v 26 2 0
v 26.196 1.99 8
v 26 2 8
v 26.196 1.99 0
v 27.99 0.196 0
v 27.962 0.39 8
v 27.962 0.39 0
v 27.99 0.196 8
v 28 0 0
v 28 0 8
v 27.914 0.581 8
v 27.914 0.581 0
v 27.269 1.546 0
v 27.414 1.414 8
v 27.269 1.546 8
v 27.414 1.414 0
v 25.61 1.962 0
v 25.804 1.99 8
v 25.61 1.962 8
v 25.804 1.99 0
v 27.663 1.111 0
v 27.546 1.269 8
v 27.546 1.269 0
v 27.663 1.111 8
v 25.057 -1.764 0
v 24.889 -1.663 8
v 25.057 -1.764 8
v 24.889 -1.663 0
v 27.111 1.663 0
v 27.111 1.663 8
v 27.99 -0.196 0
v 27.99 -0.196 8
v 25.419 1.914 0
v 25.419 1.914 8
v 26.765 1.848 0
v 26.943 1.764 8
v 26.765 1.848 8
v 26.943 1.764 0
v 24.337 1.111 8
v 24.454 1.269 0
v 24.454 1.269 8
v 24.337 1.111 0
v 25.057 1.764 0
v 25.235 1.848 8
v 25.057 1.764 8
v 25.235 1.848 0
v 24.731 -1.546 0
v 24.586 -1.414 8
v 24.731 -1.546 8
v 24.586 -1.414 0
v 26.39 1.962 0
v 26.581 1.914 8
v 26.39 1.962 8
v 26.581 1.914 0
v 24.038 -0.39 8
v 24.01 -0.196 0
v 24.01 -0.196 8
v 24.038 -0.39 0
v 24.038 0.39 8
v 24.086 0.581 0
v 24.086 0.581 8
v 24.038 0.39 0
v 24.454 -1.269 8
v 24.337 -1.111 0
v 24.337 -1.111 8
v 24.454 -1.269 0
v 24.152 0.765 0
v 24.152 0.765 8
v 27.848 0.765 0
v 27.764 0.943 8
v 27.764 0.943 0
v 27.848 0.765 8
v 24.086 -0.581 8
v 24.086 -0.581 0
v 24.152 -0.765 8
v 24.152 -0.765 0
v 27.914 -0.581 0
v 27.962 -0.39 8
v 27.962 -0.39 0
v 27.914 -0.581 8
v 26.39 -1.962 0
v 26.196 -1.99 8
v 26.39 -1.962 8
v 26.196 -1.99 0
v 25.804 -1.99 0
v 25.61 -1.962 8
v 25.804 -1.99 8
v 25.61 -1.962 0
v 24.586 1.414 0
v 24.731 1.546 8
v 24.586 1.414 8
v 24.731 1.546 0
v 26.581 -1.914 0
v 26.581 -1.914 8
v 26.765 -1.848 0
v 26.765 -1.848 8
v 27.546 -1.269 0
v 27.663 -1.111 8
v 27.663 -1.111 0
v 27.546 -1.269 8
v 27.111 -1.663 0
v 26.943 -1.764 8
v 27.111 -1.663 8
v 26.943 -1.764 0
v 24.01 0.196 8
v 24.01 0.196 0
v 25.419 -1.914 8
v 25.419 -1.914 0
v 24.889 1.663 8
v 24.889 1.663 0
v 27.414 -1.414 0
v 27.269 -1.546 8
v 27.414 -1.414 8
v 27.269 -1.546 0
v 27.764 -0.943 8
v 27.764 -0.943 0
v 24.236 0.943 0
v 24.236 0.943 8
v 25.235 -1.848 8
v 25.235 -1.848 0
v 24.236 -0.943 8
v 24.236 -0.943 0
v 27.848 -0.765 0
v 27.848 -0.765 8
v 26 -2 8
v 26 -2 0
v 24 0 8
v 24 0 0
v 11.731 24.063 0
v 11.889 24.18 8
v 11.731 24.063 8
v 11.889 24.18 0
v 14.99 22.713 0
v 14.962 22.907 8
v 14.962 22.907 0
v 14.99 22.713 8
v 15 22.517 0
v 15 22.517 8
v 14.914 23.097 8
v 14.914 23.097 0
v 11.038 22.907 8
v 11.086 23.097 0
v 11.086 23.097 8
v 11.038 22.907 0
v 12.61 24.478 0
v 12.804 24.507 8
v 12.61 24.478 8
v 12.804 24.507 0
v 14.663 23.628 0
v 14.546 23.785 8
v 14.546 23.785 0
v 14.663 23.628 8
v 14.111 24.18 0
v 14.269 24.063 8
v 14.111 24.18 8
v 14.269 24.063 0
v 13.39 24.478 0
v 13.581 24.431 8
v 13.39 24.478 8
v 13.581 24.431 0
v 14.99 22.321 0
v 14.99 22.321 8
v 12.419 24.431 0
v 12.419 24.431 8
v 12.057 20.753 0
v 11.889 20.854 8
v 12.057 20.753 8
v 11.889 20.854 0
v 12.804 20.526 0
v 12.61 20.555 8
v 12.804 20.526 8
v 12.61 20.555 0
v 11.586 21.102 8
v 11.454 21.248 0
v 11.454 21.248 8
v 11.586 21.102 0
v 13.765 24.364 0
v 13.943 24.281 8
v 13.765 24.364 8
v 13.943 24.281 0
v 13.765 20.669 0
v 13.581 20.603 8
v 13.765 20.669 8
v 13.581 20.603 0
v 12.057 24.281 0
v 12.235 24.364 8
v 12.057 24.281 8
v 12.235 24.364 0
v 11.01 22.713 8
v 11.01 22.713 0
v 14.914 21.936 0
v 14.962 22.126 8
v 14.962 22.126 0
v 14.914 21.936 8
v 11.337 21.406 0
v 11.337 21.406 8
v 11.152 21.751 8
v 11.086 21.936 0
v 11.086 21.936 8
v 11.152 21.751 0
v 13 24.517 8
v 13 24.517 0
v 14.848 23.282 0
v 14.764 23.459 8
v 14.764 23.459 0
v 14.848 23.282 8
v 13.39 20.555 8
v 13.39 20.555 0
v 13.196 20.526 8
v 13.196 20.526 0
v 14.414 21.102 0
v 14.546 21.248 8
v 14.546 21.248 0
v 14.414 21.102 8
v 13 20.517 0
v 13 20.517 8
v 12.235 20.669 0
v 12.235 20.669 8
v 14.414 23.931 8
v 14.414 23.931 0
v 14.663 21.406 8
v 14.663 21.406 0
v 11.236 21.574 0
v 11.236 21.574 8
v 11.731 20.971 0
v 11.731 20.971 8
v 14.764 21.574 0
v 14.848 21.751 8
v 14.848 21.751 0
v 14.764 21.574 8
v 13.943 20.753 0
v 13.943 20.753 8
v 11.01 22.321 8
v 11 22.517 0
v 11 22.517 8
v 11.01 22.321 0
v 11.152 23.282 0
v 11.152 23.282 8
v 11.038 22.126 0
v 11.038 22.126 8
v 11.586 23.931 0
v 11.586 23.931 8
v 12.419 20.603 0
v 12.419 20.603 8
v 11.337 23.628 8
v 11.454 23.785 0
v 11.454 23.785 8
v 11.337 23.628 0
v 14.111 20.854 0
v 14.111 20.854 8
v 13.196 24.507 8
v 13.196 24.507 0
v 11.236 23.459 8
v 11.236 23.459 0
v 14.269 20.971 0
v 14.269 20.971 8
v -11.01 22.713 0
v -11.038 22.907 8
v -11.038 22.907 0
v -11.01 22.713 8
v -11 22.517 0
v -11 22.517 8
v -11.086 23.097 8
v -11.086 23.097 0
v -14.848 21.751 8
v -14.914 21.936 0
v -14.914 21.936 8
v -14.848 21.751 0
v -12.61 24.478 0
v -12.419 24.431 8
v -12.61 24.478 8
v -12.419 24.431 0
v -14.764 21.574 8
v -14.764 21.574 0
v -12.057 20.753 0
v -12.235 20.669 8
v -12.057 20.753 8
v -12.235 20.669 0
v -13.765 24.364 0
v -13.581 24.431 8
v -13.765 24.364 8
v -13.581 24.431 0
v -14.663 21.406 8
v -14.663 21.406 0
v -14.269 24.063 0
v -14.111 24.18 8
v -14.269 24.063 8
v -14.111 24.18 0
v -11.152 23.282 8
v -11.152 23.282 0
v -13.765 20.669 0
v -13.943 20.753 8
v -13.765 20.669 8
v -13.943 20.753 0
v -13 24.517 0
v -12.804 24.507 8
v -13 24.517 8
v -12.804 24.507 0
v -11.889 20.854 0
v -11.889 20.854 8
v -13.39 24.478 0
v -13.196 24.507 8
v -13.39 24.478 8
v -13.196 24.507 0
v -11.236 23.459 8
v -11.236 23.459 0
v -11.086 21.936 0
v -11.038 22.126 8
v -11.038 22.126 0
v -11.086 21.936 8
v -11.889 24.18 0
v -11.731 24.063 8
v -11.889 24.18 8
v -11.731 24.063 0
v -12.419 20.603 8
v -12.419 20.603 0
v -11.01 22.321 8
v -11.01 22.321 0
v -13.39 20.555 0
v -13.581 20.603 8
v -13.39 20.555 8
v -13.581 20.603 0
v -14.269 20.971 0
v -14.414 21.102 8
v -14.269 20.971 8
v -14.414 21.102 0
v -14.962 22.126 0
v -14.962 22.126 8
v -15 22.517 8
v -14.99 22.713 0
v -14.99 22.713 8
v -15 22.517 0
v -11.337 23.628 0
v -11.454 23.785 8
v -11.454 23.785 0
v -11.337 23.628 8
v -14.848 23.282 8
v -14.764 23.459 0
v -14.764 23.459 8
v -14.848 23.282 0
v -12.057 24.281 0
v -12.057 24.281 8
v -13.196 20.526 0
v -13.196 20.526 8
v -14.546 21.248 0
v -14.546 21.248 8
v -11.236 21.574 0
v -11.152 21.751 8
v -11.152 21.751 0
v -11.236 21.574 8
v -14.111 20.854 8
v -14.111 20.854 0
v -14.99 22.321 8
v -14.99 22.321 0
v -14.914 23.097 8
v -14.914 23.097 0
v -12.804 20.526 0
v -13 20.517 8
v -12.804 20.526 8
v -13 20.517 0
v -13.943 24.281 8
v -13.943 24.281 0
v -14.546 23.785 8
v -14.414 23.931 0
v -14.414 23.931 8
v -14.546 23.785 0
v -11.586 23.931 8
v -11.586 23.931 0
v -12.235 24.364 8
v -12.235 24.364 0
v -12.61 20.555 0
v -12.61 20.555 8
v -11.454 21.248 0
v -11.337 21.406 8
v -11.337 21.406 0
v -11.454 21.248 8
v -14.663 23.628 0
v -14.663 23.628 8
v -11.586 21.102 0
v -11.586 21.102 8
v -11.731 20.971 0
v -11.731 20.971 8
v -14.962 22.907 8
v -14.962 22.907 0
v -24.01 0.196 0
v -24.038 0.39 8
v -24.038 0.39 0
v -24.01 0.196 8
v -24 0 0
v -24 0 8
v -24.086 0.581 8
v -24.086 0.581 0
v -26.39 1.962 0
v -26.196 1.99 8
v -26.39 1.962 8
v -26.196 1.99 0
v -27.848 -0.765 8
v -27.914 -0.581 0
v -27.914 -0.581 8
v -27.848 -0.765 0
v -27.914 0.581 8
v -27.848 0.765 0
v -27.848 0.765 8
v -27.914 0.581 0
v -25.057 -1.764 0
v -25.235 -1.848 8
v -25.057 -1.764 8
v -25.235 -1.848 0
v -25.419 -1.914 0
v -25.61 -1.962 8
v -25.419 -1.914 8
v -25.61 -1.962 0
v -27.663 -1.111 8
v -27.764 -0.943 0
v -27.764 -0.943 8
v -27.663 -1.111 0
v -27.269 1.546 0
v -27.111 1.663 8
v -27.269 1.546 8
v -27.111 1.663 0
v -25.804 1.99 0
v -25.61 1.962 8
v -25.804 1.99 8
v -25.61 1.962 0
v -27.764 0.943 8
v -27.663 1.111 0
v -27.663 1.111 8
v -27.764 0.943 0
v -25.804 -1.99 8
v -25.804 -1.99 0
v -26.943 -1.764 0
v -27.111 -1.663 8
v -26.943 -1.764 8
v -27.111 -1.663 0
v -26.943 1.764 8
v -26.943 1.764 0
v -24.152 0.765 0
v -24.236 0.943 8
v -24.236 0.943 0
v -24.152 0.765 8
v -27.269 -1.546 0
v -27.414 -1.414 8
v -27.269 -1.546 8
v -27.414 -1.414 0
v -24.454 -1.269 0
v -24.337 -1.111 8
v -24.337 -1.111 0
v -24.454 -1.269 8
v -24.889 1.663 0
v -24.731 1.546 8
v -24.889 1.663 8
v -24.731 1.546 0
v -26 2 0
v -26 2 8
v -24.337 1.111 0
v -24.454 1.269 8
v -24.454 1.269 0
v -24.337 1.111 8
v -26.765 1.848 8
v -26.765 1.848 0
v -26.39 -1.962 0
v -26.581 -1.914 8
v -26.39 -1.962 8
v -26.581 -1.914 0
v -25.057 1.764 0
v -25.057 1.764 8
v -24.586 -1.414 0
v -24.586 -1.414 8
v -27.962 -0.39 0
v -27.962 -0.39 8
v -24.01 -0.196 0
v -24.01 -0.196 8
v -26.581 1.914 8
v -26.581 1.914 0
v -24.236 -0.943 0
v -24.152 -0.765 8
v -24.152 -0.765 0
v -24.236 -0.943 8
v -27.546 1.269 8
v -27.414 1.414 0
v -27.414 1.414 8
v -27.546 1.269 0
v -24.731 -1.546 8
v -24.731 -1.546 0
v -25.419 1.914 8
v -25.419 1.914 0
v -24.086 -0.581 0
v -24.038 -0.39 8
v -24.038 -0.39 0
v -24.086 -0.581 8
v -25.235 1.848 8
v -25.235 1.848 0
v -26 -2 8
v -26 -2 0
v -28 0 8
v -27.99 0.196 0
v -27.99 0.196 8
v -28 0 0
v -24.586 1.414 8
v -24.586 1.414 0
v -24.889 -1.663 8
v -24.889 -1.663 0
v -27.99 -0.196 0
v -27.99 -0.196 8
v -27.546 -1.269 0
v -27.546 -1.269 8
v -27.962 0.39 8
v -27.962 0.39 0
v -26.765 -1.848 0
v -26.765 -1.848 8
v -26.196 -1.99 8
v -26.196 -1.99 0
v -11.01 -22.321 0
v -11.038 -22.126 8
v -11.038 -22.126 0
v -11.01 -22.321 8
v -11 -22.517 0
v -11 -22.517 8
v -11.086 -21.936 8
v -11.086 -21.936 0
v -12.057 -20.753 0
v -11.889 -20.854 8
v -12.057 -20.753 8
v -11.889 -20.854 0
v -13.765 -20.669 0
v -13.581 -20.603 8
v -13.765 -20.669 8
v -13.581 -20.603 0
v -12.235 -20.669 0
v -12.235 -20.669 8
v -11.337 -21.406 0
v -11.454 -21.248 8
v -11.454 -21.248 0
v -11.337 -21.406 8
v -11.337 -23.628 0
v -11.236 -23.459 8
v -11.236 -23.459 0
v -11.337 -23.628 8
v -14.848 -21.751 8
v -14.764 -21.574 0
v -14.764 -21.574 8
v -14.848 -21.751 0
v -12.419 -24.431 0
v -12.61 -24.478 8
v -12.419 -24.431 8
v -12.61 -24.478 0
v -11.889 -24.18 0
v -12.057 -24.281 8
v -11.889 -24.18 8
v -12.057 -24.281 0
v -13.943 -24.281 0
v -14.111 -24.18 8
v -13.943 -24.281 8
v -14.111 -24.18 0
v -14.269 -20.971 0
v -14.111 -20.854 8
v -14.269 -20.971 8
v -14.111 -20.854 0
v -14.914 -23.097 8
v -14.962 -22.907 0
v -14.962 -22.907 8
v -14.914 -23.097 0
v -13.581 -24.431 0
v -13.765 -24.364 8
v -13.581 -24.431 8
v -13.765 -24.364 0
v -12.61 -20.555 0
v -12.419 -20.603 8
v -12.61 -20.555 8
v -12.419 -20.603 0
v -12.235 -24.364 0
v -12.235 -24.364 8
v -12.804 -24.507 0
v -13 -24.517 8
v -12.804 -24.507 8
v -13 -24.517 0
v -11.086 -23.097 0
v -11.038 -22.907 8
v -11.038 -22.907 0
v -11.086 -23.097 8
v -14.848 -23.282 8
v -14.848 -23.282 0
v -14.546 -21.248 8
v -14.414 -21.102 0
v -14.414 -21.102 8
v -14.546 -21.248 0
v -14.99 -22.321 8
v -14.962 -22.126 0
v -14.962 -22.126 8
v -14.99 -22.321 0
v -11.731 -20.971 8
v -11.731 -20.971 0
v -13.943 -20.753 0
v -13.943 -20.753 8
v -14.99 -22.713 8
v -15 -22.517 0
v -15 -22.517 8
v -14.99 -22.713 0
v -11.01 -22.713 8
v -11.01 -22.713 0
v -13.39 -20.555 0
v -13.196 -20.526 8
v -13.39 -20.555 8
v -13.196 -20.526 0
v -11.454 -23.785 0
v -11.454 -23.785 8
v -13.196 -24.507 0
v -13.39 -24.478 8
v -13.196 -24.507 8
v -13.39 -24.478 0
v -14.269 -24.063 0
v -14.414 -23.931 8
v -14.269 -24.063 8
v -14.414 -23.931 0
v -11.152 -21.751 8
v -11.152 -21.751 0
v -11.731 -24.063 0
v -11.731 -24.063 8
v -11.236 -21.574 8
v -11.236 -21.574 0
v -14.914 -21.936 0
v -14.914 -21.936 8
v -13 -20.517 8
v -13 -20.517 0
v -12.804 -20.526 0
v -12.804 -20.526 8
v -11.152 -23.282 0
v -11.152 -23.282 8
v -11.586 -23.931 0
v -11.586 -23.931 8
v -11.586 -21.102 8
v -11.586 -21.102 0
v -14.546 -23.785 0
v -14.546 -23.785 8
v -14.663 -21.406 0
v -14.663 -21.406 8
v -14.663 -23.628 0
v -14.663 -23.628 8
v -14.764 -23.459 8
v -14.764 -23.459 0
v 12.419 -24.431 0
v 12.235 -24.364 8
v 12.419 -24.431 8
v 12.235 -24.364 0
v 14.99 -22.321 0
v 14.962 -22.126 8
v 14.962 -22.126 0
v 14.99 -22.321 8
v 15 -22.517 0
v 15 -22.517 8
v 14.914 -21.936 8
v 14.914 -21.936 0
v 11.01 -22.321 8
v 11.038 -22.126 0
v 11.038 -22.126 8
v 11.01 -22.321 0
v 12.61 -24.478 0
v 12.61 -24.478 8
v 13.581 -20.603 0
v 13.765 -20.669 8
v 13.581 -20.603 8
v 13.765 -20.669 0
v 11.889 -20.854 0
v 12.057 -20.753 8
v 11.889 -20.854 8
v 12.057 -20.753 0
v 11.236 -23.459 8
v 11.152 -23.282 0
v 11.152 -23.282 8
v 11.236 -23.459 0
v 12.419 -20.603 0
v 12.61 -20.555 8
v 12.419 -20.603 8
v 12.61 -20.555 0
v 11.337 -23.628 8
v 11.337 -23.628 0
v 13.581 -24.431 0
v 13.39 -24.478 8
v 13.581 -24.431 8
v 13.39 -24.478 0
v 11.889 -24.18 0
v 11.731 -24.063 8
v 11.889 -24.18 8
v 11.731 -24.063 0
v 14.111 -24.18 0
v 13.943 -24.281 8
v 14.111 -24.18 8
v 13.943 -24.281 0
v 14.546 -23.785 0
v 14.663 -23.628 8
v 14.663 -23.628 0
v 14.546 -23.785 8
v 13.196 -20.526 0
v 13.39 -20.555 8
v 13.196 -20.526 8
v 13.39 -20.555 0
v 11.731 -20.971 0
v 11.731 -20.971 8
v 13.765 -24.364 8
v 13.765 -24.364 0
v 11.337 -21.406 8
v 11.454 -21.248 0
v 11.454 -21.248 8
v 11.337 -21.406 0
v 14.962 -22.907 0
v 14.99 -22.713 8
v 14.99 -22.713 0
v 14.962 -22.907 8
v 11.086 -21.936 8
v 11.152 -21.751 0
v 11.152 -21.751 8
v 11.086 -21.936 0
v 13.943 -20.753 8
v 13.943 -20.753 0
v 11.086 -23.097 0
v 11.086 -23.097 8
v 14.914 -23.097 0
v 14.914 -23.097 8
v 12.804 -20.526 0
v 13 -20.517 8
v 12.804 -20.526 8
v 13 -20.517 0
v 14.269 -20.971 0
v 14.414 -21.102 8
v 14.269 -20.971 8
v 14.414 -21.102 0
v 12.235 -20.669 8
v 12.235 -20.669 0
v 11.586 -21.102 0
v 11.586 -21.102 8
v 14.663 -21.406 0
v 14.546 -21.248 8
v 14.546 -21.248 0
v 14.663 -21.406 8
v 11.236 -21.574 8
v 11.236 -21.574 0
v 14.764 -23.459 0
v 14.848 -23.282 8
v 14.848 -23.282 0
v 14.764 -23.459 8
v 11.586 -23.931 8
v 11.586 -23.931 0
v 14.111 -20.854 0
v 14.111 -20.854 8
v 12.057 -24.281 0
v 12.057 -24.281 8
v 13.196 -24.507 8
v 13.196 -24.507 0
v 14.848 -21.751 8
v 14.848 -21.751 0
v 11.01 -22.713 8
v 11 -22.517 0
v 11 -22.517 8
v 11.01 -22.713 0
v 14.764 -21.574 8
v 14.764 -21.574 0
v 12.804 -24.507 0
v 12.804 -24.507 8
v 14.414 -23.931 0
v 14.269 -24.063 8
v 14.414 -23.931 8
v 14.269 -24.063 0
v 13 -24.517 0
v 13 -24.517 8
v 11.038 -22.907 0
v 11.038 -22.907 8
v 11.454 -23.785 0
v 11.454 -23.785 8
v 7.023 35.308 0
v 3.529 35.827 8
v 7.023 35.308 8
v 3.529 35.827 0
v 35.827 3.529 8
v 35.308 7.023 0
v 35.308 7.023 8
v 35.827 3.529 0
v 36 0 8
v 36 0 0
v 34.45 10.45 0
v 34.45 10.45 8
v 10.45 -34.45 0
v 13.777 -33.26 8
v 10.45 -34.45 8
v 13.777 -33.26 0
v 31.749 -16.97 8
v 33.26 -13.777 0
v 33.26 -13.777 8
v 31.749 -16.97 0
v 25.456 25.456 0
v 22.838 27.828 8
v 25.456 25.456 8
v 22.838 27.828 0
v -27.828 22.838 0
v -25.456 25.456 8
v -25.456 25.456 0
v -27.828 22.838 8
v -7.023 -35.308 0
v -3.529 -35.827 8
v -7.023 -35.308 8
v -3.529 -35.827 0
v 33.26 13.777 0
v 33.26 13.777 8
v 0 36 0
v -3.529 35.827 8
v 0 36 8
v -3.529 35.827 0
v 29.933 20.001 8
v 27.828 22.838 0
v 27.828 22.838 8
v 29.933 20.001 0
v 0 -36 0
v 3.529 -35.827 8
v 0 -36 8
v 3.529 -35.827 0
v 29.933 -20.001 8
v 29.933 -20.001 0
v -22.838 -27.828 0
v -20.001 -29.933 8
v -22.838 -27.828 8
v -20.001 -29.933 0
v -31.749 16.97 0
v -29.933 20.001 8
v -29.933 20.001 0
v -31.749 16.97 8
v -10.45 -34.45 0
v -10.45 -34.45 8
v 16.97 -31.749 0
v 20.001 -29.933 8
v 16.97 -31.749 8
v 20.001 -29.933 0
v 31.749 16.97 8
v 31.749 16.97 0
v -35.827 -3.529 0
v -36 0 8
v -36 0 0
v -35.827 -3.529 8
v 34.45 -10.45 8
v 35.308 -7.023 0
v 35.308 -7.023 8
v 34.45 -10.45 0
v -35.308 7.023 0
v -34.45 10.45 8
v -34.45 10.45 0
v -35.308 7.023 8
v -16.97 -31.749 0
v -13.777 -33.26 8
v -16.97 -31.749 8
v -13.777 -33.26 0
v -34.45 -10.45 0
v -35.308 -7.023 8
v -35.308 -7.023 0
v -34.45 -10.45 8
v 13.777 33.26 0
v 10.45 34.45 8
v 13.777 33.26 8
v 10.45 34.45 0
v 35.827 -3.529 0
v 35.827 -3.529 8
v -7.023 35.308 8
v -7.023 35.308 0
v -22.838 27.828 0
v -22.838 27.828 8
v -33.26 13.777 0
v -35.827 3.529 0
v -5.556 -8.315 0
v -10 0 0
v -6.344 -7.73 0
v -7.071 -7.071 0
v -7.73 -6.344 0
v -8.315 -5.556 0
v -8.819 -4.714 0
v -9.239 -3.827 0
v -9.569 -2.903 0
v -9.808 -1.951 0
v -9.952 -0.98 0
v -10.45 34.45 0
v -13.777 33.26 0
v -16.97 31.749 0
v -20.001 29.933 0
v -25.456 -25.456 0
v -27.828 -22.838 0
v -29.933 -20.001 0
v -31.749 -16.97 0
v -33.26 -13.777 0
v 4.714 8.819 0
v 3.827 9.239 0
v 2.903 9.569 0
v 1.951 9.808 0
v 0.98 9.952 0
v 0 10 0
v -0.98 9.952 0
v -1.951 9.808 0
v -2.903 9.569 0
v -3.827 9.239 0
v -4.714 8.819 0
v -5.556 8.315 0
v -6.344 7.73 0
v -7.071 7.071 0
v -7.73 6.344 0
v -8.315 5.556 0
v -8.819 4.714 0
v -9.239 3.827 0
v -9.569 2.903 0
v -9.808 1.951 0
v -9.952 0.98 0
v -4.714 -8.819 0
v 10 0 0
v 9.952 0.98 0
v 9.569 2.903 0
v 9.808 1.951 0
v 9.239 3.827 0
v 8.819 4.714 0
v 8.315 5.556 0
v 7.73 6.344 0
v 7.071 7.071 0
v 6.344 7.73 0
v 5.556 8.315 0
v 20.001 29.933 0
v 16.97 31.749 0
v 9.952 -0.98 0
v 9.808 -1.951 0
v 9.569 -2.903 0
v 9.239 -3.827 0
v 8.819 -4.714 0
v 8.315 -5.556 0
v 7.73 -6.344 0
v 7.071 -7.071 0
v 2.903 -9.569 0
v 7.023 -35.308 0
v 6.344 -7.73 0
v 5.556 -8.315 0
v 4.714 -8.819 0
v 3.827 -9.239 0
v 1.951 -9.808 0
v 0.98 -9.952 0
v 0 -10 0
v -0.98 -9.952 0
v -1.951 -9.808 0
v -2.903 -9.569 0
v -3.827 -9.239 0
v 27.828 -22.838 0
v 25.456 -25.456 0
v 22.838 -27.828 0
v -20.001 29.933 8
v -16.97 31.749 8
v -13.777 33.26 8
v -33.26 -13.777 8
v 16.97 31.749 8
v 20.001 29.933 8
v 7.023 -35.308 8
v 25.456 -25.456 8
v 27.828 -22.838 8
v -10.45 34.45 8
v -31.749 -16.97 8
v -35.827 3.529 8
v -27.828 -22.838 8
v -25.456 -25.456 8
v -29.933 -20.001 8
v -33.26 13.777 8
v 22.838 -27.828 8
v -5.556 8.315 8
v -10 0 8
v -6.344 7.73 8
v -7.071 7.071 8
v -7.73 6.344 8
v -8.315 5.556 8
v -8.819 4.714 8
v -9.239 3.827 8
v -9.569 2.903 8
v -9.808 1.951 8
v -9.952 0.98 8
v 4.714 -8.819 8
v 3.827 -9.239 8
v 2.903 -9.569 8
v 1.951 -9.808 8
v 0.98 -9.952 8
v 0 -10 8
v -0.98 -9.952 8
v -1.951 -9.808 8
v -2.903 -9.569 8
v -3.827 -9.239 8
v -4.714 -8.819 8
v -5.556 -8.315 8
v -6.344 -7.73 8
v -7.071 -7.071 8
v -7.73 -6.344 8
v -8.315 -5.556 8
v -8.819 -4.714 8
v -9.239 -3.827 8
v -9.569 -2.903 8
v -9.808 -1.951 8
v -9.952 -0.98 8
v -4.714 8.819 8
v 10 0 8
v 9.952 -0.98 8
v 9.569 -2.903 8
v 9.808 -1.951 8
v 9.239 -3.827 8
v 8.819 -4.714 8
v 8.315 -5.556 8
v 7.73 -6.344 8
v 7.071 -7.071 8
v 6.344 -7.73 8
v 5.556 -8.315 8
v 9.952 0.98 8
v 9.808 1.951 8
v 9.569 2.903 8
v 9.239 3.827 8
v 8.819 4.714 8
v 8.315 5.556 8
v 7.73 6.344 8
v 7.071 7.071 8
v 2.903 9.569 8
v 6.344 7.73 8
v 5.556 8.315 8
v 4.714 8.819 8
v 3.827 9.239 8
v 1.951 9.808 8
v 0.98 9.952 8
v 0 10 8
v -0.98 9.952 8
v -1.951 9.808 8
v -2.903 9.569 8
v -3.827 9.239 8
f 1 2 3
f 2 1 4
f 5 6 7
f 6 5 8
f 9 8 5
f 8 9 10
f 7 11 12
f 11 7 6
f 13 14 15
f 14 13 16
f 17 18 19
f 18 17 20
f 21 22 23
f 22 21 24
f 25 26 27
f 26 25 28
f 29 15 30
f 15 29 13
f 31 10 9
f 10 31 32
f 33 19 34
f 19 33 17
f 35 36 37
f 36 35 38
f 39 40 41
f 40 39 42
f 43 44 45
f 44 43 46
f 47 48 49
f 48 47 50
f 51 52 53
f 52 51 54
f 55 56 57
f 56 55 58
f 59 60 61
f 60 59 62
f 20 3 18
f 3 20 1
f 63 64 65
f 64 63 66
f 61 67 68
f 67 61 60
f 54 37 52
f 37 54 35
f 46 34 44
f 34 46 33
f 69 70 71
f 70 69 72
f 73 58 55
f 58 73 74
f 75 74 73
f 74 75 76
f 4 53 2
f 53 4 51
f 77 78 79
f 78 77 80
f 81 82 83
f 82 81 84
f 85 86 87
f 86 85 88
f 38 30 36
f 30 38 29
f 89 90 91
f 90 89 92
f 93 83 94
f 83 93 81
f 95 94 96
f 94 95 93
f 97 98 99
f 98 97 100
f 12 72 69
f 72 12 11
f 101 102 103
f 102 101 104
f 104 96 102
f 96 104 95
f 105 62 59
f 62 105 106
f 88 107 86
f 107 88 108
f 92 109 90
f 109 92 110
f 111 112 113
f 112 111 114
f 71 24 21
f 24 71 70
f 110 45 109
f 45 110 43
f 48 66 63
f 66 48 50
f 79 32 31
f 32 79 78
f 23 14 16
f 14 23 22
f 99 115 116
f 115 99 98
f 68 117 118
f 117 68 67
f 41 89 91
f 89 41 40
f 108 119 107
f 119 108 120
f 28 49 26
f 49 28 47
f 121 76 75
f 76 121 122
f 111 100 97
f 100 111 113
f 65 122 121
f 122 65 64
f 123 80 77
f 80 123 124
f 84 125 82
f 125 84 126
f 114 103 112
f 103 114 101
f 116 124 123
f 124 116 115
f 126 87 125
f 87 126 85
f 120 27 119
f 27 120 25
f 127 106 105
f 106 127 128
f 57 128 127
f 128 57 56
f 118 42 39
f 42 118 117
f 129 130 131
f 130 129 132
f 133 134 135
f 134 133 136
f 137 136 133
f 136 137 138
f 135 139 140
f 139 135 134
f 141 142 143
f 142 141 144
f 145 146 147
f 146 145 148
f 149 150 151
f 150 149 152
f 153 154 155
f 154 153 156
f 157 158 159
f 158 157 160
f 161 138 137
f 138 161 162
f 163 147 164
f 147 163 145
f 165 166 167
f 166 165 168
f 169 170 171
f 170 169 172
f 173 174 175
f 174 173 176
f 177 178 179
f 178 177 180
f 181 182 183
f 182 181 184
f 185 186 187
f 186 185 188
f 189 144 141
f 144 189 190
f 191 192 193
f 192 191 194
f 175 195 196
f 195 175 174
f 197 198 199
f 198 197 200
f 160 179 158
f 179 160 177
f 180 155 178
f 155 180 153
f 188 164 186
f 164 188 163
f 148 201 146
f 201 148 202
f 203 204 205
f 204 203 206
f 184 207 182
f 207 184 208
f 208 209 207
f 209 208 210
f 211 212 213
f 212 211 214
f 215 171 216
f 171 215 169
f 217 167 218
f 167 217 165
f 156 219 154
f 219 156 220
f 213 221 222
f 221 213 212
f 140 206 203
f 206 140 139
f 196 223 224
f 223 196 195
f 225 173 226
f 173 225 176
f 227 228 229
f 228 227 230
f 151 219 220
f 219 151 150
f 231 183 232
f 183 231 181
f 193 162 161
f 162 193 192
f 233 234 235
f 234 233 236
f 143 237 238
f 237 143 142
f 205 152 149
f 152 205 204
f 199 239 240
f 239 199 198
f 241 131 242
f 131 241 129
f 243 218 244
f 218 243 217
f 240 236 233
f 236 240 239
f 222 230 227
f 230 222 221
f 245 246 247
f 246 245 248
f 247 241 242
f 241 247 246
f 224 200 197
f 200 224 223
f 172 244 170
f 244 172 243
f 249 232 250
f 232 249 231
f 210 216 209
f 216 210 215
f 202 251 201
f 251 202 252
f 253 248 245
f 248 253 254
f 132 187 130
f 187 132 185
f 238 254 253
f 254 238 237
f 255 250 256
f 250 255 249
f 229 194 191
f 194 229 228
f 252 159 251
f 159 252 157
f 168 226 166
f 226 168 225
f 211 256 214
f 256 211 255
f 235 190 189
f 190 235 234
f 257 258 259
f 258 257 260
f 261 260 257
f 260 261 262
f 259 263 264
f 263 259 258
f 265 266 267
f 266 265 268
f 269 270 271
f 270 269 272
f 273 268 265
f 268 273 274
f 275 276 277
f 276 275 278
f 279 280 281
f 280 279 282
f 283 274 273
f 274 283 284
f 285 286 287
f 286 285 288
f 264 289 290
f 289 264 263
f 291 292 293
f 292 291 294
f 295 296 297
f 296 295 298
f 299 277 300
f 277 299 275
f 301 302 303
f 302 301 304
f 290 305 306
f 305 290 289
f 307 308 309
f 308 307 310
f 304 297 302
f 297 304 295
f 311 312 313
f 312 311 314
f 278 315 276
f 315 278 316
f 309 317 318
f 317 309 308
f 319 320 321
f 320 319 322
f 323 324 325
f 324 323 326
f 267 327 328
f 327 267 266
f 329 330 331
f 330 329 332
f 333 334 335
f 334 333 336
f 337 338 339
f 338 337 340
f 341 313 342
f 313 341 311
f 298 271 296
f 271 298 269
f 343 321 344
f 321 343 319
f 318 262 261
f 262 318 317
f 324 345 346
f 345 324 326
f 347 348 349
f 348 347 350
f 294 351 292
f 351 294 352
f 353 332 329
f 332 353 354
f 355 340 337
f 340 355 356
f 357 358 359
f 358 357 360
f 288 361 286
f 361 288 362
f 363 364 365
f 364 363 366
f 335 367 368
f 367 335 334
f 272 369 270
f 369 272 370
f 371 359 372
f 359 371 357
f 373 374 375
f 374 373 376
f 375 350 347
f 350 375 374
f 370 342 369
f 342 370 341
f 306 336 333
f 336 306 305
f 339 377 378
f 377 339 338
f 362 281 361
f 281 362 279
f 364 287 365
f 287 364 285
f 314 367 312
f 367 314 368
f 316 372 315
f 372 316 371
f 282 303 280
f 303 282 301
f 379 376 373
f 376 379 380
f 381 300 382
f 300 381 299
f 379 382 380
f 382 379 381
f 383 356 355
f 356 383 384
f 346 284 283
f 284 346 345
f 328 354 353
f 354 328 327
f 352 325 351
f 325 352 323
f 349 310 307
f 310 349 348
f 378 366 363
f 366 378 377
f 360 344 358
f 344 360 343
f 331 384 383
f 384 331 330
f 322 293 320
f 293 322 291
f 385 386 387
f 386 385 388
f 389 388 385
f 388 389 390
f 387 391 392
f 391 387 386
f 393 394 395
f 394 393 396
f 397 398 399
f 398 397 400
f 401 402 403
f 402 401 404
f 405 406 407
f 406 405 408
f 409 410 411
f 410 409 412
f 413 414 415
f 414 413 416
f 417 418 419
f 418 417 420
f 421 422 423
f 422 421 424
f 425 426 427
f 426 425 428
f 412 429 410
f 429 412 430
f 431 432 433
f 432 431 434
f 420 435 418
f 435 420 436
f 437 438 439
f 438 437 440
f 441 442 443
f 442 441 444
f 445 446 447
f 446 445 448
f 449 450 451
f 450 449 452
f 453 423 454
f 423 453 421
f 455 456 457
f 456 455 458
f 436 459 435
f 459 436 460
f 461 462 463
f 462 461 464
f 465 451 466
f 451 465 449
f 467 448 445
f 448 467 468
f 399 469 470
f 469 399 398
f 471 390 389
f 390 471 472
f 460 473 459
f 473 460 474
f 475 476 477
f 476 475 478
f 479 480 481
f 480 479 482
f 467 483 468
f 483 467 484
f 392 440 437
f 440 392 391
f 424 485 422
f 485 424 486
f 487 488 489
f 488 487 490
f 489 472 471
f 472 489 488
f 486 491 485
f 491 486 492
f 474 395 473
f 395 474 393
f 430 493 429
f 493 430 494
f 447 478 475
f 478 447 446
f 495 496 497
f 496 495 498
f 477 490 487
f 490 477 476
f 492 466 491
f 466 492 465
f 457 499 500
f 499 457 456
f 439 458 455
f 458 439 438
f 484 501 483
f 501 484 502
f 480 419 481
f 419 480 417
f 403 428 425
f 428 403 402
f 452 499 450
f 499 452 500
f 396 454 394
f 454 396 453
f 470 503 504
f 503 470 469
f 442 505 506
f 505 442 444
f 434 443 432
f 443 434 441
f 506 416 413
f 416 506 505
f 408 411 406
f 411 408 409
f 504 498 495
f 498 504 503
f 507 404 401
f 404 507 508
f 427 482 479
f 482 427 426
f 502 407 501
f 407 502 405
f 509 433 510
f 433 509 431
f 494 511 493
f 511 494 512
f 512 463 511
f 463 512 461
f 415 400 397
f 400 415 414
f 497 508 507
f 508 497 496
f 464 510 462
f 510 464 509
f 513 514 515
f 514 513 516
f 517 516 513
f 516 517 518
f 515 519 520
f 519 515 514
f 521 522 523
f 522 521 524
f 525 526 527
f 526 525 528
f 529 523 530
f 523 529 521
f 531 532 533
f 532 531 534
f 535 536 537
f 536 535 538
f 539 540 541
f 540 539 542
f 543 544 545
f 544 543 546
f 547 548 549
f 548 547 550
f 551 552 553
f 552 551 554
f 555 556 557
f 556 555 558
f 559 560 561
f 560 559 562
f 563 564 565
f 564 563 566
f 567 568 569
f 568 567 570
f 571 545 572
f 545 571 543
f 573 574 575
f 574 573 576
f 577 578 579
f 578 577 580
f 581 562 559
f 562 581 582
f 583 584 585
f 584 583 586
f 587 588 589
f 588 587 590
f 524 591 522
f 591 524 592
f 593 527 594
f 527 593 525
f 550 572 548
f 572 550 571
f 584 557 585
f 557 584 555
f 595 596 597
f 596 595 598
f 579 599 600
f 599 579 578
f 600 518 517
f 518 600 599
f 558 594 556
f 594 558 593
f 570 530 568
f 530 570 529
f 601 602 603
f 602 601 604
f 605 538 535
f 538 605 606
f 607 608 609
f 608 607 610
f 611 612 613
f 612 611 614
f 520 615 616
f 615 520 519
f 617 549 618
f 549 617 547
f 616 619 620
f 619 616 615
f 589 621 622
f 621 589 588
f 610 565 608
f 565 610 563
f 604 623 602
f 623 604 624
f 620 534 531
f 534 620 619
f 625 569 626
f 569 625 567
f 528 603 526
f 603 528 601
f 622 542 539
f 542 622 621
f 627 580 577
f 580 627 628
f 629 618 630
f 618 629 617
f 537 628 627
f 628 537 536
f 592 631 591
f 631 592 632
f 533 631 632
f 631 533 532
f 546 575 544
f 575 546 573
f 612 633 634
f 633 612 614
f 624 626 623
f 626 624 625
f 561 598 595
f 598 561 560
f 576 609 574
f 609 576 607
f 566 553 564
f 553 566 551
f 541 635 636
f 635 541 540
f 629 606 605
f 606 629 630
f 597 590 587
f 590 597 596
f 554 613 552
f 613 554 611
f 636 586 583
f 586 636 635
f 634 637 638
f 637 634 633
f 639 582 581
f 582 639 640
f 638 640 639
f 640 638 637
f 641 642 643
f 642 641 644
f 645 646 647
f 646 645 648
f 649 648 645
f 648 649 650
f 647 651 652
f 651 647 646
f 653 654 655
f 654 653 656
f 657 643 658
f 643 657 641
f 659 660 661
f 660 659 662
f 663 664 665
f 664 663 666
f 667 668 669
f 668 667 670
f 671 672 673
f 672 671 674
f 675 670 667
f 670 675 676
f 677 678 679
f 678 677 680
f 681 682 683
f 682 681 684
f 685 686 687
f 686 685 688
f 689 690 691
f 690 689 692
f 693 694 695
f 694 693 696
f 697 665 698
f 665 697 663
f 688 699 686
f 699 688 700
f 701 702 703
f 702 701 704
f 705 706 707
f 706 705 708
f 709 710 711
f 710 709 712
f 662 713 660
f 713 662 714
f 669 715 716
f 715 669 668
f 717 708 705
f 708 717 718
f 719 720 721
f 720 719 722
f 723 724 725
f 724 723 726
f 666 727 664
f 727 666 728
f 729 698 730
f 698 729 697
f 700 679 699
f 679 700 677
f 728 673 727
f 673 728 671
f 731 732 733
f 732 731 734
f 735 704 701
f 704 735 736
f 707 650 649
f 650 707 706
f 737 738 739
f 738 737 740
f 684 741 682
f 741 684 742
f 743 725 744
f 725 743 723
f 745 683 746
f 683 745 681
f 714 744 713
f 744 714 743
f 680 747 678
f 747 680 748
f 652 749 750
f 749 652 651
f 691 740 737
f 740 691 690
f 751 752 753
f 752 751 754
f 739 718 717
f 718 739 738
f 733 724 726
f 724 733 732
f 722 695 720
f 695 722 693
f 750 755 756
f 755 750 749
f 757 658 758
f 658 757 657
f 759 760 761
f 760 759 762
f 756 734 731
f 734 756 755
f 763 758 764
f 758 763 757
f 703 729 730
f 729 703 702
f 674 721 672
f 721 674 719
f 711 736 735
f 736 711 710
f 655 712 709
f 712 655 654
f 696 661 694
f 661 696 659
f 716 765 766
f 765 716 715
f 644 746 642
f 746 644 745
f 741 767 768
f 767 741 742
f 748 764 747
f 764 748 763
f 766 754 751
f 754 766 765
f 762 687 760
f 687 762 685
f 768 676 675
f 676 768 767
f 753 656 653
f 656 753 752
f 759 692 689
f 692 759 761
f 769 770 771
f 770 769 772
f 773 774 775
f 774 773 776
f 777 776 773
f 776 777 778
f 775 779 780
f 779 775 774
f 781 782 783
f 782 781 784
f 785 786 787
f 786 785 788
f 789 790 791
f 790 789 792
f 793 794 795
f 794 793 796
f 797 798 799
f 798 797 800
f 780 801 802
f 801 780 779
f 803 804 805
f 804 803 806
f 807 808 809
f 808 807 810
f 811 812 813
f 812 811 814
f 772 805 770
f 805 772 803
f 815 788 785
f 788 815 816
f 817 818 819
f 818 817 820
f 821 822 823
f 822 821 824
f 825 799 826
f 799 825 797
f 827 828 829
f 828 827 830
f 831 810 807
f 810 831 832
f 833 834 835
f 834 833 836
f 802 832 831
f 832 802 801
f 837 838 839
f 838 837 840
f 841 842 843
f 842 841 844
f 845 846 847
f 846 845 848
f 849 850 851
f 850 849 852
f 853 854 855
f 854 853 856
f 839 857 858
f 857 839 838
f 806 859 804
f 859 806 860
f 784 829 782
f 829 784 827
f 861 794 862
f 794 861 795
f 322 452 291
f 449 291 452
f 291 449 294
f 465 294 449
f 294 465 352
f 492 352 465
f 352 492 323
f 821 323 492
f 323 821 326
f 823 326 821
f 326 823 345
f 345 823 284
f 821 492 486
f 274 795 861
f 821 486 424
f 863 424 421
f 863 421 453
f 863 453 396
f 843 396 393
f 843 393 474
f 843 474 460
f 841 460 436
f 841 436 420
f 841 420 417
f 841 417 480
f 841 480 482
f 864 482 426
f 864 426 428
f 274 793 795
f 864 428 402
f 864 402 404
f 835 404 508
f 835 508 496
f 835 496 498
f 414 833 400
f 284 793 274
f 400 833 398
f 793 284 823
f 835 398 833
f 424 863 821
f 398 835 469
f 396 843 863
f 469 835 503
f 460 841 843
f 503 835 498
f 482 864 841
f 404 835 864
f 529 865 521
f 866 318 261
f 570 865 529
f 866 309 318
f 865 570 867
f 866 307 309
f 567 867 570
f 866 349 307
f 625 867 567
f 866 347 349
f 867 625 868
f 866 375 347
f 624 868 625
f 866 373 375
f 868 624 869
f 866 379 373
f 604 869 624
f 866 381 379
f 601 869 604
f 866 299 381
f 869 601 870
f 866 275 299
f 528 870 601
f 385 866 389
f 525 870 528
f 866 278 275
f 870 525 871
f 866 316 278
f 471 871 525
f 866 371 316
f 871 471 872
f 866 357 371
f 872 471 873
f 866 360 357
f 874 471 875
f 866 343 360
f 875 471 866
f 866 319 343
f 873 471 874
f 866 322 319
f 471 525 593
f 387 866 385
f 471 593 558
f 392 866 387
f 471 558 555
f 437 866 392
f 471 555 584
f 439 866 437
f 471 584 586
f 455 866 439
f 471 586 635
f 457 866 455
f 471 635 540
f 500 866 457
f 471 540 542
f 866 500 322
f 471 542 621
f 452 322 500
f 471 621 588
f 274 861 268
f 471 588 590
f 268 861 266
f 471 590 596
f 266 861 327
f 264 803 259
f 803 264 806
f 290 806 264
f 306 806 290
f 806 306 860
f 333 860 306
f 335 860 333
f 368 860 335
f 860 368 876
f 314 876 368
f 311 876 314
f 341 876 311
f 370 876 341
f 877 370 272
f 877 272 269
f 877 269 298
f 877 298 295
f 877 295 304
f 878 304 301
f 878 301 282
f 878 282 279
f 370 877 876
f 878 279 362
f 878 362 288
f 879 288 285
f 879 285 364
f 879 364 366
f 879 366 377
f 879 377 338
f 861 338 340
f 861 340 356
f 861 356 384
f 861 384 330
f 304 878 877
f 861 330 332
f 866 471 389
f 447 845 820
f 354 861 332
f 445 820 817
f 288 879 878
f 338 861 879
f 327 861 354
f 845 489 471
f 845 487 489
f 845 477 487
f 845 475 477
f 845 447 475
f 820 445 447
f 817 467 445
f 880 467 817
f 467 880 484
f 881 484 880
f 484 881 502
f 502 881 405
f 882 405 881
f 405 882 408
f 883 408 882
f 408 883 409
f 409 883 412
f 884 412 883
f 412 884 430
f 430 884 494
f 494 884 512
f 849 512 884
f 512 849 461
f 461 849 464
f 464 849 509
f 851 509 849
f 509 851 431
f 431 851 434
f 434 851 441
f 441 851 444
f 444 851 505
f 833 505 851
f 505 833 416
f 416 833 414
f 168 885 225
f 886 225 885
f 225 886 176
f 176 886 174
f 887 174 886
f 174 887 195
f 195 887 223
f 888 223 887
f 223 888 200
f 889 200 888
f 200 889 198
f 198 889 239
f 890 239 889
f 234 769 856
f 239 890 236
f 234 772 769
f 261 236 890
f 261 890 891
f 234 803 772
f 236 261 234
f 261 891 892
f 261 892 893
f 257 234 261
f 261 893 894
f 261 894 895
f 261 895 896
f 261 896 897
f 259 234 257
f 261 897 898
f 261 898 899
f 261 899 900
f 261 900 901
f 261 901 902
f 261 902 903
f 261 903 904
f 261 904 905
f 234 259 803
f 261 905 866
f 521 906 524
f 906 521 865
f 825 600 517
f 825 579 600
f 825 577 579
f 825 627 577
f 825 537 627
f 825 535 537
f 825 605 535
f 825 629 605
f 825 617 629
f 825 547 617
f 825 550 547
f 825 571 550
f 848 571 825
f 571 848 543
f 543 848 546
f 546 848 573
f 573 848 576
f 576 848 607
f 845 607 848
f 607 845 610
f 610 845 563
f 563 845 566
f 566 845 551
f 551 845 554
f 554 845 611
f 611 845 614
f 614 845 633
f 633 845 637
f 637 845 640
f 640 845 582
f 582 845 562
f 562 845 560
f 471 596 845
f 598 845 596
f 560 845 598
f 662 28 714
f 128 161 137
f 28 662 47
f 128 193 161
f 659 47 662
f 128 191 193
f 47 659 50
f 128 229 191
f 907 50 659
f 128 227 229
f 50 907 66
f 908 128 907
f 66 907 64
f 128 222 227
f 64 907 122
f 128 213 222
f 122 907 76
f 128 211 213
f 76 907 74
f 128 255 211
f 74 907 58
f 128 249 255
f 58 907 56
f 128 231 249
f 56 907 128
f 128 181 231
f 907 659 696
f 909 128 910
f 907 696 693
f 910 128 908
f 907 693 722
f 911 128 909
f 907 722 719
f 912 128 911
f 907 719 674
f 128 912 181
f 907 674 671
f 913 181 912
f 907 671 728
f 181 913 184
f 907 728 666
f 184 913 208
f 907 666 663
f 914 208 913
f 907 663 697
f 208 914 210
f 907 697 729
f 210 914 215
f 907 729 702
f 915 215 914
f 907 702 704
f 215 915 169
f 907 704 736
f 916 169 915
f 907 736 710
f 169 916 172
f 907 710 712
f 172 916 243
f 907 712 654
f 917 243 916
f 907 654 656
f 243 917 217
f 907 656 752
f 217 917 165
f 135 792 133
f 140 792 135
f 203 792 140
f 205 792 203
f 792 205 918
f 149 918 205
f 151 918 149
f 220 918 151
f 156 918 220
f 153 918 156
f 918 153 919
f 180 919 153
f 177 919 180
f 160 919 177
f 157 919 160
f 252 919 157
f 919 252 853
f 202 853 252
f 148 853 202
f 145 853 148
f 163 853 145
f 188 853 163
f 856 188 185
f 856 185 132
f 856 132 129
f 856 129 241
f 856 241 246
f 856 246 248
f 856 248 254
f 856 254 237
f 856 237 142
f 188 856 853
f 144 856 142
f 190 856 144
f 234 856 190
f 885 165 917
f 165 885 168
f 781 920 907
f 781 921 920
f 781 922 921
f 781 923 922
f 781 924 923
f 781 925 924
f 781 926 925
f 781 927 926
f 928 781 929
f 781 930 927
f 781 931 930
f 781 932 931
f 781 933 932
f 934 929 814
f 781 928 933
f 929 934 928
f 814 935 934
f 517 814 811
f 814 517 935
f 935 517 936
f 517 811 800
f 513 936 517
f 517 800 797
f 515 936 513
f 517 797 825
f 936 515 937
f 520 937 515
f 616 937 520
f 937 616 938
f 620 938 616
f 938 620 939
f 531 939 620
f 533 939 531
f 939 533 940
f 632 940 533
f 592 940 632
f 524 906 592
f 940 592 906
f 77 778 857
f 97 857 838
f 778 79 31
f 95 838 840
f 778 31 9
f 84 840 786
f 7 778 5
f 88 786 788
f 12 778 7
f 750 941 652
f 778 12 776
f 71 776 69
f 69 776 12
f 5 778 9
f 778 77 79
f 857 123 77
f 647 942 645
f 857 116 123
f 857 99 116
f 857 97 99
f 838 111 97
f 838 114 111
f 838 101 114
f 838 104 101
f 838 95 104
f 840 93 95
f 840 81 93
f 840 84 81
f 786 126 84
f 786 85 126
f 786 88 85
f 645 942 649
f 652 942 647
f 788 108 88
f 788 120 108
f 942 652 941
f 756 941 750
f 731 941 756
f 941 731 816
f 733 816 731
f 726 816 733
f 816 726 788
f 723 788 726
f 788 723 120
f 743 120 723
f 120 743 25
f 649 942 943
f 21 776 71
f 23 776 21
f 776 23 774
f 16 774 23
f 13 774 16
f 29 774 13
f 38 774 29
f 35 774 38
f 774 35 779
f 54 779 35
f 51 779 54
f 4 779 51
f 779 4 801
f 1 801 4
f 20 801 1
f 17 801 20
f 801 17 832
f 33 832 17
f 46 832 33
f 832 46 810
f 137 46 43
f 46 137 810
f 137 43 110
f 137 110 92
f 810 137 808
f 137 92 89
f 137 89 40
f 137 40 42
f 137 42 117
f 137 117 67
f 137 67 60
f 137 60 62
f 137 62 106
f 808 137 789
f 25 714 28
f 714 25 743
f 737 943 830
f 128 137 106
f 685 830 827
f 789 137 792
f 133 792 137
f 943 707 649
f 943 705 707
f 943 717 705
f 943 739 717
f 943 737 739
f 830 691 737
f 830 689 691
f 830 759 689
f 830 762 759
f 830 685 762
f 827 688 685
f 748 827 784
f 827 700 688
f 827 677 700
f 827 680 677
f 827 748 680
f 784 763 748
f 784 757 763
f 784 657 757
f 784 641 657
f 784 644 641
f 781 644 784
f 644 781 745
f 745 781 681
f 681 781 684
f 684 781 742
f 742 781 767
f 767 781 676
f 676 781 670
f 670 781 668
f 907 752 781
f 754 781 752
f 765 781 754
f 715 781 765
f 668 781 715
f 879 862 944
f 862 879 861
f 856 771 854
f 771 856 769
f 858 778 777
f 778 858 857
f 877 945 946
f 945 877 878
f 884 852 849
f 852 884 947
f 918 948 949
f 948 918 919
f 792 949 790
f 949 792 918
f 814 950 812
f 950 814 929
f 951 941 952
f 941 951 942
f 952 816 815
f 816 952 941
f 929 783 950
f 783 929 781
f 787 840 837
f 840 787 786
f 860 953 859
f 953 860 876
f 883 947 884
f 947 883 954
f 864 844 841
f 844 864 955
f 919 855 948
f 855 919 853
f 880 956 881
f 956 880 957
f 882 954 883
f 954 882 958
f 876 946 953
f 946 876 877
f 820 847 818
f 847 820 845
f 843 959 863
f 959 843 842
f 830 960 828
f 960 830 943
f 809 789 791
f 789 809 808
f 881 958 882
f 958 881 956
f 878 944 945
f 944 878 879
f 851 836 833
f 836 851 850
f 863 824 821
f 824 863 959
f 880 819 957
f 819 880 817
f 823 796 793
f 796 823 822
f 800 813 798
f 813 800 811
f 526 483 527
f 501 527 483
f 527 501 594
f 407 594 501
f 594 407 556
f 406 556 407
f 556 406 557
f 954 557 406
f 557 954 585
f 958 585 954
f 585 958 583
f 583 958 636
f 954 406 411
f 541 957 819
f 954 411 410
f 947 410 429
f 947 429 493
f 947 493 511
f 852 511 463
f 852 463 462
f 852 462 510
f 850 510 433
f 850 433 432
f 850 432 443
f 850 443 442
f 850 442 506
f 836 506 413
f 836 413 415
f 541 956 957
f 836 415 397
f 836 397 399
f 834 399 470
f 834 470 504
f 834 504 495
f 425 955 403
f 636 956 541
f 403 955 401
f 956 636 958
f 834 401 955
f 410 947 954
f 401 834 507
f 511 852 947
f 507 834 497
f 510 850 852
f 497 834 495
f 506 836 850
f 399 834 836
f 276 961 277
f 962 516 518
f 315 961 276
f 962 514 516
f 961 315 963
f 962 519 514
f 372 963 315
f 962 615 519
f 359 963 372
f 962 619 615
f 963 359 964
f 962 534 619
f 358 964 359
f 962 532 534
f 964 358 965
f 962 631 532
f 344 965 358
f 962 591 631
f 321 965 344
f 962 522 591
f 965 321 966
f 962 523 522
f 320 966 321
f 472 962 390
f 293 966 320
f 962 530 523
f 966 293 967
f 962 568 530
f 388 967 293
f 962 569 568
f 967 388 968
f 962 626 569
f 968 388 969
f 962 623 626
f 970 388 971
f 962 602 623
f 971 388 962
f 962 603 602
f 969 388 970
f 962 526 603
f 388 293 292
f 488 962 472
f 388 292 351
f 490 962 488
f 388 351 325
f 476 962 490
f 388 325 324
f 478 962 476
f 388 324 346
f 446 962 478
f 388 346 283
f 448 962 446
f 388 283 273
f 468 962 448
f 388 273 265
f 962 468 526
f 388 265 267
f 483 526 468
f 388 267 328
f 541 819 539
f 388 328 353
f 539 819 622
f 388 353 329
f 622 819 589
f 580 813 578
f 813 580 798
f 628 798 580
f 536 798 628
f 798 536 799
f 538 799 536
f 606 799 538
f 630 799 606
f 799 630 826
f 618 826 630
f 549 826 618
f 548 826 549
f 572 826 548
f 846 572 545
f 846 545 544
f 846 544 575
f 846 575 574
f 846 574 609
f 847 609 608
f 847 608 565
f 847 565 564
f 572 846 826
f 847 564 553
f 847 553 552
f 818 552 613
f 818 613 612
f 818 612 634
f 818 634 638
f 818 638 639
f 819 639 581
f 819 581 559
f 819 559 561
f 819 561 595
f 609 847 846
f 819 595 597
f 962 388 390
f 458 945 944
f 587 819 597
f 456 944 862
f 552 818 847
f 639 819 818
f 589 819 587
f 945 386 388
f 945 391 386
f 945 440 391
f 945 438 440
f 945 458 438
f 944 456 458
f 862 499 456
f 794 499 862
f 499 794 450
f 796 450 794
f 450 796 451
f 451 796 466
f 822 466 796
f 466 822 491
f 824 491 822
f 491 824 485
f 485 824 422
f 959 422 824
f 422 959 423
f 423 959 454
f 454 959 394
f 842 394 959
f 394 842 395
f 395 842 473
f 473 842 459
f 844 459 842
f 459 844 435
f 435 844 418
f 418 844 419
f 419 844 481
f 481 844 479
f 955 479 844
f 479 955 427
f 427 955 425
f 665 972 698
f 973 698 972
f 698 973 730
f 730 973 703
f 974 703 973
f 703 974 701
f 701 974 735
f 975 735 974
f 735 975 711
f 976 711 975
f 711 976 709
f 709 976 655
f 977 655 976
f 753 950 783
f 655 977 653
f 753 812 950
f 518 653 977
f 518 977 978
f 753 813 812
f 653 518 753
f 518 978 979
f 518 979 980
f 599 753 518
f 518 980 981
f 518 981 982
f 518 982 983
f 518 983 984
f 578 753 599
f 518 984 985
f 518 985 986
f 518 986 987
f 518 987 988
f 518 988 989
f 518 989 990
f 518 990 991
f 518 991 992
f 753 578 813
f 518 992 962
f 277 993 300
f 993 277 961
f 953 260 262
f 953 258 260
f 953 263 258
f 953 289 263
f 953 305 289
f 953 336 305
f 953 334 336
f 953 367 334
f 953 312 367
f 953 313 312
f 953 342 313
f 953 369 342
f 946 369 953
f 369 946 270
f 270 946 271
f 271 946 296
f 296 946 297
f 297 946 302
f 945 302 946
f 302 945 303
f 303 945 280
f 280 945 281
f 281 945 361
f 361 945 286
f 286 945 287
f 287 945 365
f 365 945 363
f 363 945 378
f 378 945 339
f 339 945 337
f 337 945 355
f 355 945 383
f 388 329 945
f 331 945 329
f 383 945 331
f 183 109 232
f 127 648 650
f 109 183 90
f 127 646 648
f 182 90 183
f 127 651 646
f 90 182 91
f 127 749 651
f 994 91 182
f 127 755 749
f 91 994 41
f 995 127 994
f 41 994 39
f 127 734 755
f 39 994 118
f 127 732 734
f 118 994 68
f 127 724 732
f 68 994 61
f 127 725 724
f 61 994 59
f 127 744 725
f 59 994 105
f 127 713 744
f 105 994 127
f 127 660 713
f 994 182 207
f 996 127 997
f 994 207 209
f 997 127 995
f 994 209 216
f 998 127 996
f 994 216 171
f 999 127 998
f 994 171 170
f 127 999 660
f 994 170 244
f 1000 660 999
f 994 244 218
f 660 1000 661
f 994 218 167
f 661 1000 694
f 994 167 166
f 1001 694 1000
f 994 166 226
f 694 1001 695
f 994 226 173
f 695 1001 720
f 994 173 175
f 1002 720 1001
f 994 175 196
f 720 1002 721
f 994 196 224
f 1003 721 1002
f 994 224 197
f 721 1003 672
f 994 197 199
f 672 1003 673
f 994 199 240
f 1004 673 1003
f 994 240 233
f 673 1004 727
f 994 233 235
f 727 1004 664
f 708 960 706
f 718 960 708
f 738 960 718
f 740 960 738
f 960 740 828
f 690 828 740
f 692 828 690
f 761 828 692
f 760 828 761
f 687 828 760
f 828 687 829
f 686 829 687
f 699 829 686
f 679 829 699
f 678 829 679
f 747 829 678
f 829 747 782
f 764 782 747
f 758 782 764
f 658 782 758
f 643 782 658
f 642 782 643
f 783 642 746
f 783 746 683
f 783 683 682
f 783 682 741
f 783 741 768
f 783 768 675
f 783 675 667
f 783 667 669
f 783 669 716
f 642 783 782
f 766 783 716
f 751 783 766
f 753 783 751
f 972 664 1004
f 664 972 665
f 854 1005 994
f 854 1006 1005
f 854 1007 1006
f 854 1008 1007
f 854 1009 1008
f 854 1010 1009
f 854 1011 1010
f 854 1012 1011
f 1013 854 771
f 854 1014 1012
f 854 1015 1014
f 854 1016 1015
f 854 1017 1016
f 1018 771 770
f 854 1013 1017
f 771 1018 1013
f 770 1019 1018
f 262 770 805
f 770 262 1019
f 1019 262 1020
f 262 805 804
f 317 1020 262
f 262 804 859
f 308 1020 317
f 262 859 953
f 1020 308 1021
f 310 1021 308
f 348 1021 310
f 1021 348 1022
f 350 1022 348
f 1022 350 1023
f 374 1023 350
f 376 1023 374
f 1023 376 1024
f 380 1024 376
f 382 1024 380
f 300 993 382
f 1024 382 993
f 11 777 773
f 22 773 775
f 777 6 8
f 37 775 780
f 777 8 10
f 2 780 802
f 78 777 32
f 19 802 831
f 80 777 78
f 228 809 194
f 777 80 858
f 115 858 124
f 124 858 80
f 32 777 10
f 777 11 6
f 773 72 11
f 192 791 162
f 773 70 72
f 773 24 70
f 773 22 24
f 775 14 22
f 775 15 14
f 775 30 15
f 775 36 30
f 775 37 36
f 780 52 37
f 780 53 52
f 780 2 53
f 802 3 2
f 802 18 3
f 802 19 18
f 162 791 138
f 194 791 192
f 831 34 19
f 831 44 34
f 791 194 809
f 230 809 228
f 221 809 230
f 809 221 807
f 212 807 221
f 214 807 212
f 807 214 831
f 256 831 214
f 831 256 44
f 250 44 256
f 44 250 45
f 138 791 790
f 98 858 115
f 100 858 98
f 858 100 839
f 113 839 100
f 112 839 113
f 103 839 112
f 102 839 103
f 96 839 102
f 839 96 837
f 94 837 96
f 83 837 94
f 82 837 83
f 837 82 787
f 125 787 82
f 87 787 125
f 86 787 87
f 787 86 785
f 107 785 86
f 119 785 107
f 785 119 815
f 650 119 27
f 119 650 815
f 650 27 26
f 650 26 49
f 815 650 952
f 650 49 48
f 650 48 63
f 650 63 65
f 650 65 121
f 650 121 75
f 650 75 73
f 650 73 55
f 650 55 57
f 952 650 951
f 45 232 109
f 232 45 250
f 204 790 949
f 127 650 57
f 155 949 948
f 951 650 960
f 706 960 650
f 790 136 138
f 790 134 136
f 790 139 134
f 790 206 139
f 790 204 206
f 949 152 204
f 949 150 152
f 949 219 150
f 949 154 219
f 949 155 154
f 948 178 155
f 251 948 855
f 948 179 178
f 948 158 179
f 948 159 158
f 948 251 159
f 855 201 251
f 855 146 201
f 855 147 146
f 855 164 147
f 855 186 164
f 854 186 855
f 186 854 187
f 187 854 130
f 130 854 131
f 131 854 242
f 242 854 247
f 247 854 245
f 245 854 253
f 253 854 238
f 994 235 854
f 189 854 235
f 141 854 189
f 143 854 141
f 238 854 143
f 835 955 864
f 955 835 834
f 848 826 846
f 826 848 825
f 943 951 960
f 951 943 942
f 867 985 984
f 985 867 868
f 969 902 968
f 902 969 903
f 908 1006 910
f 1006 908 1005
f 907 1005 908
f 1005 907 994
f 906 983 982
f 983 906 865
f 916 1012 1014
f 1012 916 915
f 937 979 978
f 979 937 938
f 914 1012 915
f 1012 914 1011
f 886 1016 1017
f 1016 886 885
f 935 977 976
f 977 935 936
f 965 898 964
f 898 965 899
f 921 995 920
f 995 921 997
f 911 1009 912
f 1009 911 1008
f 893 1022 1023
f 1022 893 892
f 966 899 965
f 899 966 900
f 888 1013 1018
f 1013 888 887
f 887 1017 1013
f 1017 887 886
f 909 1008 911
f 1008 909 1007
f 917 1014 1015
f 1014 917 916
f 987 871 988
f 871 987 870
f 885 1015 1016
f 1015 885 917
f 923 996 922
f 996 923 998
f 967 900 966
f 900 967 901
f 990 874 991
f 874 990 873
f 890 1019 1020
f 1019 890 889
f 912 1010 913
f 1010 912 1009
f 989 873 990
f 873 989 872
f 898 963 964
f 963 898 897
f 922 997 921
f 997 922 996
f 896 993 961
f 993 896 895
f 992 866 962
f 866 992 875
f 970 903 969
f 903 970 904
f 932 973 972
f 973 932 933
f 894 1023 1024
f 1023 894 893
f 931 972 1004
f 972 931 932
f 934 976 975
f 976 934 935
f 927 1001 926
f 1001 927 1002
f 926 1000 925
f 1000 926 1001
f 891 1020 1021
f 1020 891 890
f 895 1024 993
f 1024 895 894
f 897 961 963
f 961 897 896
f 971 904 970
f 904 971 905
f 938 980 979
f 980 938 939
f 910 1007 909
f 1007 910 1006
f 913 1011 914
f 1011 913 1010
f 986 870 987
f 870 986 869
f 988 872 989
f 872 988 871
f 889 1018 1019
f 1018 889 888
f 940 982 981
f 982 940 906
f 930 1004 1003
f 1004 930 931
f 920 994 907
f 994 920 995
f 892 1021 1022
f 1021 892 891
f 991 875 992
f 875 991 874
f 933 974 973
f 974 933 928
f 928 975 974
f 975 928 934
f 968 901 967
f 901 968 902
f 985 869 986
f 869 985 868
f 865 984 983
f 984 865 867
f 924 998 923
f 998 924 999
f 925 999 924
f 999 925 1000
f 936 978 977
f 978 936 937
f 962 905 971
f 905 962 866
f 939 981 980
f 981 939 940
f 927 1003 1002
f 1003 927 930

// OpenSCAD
// Starter flange for task-003.
$fn = 64;

outside_diameter = 72;
thickness = 8;
center_hole_diameter = 20;
bolt_circle_radius = 26;
bolt_hole_diameter = 4;
bolt_hole_count = 6;

difference() {
  cylinder(h = thickness, r = outside_diameter / 2);

  translate([0, 0, -1])
    cylinder(h = thickness + 2, r = center_hole_diameter / 2);

  for (i = [0 : bolt_hole_count - 1]) {
    angle = 360 * i / bolt_hole_count;
    translate([bolt_circle_radius * cos(angle), bolt_circle_radius * sin(angle), -1])
      cylinder(h = thickness + 2, r = bolt_hole_diameter / 2);
  }
}
